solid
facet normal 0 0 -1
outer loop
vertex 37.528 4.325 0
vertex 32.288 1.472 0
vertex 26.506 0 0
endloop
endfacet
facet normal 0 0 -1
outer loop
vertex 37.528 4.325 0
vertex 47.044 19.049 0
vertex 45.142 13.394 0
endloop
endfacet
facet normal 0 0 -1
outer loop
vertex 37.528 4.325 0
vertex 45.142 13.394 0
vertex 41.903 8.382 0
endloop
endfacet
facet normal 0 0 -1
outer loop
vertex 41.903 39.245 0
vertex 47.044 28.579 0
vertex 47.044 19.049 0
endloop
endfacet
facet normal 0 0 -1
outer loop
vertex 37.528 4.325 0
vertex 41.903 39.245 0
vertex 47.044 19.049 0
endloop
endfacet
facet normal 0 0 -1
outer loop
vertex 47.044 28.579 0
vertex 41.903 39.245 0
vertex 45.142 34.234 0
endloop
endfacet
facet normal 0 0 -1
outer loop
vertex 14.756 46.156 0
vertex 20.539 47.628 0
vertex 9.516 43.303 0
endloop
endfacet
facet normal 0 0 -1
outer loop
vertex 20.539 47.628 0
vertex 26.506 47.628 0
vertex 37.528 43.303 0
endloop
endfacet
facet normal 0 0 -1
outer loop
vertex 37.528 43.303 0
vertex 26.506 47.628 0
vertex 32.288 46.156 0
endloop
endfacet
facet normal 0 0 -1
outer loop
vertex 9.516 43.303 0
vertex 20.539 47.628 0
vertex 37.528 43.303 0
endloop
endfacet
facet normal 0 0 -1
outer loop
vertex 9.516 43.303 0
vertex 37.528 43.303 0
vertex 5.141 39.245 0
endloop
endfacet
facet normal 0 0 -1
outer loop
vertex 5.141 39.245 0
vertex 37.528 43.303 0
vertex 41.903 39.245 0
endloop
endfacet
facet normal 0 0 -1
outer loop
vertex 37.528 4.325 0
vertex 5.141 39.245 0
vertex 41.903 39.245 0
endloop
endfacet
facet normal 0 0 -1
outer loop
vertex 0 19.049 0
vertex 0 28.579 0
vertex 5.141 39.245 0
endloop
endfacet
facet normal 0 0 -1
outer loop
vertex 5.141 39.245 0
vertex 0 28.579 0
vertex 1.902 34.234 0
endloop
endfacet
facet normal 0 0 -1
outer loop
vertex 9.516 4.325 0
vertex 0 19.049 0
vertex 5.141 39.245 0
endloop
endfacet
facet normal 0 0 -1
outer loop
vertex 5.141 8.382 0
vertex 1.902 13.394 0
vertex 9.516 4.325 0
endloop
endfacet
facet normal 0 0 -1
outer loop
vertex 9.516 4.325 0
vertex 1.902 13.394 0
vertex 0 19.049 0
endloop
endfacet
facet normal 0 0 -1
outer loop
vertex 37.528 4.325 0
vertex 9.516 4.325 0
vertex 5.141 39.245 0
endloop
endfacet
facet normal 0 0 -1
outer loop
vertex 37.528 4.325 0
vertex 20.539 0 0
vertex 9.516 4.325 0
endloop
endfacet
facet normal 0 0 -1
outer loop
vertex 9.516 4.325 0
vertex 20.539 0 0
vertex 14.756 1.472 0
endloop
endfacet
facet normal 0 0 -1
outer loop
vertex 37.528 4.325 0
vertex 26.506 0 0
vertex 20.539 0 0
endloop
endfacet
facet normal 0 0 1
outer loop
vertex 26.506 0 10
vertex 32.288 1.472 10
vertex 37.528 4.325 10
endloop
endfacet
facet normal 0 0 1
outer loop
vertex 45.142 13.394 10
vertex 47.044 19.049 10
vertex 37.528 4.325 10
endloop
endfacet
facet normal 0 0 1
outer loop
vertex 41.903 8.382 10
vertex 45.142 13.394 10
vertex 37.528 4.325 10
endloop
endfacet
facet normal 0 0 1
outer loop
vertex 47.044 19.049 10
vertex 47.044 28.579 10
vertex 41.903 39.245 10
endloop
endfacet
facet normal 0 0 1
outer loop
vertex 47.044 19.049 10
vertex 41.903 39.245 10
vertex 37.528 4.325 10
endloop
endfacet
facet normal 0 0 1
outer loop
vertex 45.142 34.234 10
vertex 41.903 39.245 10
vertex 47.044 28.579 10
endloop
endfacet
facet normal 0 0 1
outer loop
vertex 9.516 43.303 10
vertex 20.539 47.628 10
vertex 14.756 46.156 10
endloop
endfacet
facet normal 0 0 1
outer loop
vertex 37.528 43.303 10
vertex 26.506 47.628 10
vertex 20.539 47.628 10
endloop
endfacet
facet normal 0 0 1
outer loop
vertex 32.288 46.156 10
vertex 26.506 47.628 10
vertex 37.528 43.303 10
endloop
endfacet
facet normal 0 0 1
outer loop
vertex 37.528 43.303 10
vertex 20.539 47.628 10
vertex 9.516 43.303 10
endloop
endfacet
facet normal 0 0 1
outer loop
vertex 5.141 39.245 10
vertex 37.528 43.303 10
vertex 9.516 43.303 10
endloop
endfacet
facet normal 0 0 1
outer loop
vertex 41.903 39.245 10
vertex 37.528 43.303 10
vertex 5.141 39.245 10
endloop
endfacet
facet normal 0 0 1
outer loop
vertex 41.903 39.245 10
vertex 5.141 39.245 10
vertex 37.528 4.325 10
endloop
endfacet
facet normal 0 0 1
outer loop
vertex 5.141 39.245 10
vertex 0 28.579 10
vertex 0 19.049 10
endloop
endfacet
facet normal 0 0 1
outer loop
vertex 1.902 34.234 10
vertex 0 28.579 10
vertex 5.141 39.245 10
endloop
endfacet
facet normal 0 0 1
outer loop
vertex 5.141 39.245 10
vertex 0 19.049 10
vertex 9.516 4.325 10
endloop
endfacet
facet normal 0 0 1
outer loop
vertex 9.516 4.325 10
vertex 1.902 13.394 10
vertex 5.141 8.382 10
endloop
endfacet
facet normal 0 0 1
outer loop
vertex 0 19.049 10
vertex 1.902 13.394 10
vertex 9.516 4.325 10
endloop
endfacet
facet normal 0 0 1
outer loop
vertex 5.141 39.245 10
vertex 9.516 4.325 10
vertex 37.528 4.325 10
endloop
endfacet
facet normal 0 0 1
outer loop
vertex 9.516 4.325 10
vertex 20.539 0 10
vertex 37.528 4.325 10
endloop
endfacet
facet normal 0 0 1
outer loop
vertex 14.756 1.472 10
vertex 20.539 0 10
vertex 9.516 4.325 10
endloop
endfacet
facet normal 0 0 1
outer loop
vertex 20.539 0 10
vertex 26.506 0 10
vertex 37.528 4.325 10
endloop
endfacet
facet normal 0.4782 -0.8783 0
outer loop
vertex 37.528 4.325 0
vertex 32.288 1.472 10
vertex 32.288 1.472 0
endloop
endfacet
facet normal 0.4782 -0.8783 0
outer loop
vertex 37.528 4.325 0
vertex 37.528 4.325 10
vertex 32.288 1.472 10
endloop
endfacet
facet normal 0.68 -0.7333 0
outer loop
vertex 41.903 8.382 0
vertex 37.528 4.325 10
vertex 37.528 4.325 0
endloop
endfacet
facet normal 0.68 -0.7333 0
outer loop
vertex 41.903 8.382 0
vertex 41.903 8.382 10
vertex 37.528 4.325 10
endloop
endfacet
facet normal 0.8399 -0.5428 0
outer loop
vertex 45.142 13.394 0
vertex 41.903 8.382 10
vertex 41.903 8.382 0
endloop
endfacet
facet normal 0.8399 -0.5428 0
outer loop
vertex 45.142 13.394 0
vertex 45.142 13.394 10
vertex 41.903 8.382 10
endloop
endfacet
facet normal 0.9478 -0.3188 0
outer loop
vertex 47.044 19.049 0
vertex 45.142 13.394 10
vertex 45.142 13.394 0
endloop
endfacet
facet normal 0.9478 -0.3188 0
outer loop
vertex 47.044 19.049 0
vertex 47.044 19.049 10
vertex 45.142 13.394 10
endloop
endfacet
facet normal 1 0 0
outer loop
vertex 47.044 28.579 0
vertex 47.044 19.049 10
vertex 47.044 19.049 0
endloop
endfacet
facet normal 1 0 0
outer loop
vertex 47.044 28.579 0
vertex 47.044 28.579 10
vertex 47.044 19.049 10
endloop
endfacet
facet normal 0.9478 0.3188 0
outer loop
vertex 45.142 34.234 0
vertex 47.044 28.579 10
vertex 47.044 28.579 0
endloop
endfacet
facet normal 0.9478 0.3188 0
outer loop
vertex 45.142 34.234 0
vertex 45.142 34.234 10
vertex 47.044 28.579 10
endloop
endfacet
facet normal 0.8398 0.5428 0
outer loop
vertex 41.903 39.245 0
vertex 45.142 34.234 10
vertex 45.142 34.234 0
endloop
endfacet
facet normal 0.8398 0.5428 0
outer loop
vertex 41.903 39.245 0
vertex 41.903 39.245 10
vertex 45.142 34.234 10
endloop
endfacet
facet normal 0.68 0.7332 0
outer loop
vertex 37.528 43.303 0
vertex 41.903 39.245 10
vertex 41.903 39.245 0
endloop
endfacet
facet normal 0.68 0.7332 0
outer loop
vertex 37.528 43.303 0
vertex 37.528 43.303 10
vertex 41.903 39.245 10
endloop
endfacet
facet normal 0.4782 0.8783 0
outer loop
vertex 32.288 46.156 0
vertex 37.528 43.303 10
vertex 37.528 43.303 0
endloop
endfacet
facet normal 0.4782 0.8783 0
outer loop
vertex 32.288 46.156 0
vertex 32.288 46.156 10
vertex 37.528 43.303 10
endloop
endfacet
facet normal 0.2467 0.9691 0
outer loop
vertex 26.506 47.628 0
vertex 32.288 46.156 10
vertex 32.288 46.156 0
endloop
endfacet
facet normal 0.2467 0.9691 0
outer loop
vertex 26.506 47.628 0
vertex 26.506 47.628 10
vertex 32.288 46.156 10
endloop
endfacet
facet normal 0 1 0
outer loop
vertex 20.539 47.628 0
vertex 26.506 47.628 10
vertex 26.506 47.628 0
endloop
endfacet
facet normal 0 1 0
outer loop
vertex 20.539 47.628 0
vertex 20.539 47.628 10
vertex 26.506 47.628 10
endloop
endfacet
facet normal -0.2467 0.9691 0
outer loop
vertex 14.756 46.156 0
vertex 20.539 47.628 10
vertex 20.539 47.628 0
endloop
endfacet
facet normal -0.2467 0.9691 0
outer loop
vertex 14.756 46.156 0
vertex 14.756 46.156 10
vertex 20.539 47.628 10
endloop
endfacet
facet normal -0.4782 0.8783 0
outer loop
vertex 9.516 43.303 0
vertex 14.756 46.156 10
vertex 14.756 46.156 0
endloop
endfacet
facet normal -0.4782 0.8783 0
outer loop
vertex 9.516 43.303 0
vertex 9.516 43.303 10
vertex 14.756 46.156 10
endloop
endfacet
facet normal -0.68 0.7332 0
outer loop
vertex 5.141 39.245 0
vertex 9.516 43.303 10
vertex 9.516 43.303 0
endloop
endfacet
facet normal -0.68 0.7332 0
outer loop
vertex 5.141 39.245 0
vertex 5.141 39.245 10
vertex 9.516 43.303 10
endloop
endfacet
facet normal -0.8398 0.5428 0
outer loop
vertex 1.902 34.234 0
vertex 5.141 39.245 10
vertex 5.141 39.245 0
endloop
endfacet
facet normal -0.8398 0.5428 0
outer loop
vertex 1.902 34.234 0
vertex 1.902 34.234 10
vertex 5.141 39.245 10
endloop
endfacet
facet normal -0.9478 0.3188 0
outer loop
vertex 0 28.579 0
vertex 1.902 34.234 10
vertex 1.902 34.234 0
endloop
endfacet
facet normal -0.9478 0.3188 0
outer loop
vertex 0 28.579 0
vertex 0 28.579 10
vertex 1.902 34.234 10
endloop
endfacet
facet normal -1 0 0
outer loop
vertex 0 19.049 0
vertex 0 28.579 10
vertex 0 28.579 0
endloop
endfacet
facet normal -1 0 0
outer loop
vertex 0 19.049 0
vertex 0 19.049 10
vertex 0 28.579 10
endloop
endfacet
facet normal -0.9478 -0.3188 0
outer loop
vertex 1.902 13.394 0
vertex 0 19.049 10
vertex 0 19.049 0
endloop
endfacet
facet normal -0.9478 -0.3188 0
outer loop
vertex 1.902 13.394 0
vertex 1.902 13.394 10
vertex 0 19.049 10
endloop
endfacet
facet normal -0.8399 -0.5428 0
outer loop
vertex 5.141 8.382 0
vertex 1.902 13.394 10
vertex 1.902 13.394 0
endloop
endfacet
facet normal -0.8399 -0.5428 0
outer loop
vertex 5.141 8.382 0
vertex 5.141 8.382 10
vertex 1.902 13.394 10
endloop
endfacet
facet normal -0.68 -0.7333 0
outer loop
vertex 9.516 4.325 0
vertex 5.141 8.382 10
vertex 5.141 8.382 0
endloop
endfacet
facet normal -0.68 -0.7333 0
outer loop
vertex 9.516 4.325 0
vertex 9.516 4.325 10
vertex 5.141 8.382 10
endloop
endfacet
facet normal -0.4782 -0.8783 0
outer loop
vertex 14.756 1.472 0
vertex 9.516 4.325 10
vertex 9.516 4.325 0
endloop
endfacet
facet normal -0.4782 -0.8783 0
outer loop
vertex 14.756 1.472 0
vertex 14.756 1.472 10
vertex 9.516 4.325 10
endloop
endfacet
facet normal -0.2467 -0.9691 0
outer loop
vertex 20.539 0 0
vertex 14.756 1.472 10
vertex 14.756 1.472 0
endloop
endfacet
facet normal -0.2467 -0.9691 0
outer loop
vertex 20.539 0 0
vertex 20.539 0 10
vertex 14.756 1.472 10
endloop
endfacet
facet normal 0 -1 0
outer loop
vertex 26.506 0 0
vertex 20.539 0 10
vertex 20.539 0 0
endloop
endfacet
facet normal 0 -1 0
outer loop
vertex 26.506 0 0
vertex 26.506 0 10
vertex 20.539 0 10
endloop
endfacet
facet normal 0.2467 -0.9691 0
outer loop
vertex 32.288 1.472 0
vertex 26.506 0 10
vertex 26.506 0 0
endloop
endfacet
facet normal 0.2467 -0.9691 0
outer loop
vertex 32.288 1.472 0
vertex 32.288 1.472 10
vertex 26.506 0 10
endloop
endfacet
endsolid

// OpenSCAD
$fn = 32;

// ----------------------------------------------------------------------
// Flat adaptor: double_d, 10 mm thick
// ----------------------------------------------------------------------

// --- parameters (mm) ---
profile_height = 10;      // extrusion height
profile_points = 24;      // points of the closed outline

profile = [[47.044, 28.579], [45.142, 34.234], [41.903, 39.245], [37.528, 43.303], [32.288, 46.156], [26.506, 47.628], [20.539, 47.628], [14.756, 46.156], [9.516, 43.303], [5.141, 39.245], [1.902, 34.234], [0, 28.579], [0, 19.049], [1.902, 13.394], [5.141, 8.382], [9.516, 4.325], [14.756, 1.472], [20.539, 0], [26.506, 0], [32.288, 1.472], [37.528, 4.325], [41.903, 8.382], [45.142, 13.394], [47.044, 19.049]];  // single closed polygon, 24 points, counter clockwise

// --- the one profile operation ---
linear_extrude(height = profile_height) polygon(points = profile);
